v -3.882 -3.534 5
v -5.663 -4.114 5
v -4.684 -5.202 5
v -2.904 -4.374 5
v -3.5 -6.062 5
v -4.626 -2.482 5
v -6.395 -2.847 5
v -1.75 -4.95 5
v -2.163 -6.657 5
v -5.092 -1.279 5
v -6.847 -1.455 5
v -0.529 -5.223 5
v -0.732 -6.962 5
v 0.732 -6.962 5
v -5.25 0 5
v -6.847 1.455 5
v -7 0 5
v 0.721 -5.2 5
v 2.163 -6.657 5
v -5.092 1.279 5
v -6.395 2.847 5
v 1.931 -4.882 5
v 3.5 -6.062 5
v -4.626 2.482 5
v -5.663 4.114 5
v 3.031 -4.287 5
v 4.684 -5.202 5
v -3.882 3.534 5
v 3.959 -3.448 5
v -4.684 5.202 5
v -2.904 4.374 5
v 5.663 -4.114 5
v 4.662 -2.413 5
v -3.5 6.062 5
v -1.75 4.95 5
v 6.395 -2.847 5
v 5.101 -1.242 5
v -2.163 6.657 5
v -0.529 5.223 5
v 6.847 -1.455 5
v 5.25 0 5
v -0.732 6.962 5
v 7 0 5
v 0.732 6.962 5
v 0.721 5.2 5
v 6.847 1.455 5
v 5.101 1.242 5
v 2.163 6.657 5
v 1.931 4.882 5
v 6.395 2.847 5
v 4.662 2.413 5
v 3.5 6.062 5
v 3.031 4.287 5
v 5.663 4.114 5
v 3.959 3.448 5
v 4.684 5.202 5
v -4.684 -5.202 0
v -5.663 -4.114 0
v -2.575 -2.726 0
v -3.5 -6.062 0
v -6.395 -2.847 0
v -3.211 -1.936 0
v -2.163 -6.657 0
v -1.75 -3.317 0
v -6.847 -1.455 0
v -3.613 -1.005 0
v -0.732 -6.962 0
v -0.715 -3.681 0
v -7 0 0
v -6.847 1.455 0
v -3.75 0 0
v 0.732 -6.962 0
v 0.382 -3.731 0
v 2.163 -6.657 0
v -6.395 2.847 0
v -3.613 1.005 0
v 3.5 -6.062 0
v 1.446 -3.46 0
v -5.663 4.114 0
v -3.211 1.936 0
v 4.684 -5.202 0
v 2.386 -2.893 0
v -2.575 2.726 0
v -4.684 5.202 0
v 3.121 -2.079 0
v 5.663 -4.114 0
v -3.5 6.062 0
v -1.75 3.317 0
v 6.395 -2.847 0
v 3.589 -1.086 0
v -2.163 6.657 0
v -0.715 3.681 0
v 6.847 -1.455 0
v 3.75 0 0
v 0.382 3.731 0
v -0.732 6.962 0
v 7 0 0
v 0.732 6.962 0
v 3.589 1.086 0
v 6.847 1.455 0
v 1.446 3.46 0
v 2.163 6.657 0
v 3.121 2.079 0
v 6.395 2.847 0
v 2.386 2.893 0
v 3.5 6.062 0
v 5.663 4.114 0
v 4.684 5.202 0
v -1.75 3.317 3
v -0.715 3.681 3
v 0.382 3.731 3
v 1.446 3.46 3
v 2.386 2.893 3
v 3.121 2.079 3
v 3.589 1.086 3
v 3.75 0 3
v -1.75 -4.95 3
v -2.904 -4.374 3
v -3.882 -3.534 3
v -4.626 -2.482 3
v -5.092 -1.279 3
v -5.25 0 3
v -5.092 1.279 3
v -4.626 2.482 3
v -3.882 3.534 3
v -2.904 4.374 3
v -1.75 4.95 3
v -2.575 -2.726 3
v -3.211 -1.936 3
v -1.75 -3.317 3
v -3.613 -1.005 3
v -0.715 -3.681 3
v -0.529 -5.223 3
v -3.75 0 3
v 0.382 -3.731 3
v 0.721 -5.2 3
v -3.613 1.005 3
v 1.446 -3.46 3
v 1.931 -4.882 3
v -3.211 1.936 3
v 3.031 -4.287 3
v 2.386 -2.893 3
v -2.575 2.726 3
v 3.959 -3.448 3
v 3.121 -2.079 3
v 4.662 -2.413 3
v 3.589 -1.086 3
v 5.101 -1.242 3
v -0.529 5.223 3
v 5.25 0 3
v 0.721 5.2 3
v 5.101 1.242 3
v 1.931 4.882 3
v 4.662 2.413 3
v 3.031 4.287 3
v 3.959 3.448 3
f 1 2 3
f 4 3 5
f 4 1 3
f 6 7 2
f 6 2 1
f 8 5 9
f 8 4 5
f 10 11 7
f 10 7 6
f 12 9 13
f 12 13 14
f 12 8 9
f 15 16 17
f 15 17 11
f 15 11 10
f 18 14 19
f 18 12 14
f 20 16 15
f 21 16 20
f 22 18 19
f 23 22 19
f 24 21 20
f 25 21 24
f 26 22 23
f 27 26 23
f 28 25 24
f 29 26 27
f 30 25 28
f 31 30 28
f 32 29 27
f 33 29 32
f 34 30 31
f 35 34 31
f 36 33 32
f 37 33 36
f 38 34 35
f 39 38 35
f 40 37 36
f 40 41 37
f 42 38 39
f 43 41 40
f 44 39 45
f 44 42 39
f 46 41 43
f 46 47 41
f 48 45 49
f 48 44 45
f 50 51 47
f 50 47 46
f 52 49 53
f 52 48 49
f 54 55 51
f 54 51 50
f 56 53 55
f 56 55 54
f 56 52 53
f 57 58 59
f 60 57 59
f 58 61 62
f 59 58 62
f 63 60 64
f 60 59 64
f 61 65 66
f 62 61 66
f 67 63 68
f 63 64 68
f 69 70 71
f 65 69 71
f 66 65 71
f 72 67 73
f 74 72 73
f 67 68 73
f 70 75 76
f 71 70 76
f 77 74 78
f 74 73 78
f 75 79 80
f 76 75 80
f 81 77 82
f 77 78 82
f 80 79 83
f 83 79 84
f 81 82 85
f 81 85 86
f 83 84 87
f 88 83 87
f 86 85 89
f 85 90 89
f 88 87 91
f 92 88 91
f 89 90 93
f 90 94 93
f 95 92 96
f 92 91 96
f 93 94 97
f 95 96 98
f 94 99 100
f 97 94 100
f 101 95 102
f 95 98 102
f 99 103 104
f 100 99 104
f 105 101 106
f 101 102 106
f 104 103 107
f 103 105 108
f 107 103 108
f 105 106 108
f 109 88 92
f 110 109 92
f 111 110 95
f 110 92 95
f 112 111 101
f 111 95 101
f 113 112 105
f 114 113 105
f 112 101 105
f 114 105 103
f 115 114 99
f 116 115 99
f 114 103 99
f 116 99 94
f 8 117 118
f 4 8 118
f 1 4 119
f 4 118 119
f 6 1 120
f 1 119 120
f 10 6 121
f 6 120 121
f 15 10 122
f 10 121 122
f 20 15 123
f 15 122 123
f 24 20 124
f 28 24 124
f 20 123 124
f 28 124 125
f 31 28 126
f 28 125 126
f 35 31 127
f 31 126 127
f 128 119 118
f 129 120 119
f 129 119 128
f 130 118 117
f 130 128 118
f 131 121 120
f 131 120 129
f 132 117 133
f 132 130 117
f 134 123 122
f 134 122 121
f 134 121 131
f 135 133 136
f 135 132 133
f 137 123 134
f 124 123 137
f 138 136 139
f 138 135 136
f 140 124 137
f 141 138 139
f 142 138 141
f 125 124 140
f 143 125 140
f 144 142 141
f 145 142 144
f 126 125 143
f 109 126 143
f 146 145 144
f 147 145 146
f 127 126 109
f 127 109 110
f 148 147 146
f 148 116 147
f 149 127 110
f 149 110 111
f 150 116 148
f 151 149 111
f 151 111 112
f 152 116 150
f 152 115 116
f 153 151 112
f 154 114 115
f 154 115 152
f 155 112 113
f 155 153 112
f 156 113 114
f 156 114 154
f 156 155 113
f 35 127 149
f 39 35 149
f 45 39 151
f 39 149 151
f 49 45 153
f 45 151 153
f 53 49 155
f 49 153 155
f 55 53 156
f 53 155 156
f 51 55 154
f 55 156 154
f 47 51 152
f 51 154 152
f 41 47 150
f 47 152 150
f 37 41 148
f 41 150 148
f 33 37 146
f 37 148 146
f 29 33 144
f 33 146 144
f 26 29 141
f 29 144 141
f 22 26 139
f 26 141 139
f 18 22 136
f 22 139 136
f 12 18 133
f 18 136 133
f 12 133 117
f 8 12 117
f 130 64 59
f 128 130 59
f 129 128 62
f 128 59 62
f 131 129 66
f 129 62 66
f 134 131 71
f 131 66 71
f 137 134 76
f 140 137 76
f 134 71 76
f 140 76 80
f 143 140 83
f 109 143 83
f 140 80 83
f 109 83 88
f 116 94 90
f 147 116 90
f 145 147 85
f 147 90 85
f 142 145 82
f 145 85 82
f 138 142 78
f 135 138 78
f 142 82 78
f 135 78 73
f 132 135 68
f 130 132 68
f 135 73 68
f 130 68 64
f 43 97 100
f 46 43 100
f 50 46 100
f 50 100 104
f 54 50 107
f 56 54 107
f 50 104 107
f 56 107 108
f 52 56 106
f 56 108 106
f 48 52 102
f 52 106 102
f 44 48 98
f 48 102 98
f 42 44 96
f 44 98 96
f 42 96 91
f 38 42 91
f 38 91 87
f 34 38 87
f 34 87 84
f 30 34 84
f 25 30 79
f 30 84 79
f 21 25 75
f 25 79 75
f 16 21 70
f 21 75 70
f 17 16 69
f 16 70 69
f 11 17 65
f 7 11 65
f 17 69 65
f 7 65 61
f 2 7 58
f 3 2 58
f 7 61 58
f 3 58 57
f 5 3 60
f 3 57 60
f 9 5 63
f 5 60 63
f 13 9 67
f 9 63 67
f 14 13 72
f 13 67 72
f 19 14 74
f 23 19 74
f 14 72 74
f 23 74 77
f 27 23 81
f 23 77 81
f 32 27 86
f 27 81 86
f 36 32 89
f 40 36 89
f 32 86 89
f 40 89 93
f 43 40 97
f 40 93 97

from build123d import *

# Parameters (mm, degrees)
F0_R     = 7
F1_DEPTH = 5
F2_DEPTH = 3


with BuildPart() as f1:
    # F0 (on Top) → F1 (new body)
    with BuildSketch(Plane.XY):
        Circle(F0_R)
        with BuildLine():
            ThreePointArc((-1.75, -4.9497474683), (-5.25, 0), (-1.75, 4.9497474683))
            ThreePointArc((-1.75, 4.9497474683), (3.0310889132, 4.2866070499), (5.25, 0))
            ThreePointArc((5.25, 0), (3.0310889132, -4.2866070499), (-1.75, -4.9497474683))
        make_face(mode=Mode.SUBTRACT)
    extrude(amount=F1_DEPTH)

    # F0 (on Top) → F2 (join)
    with BuildSketch(Plane.XY):
        with BuildLine():
            ThreePointArc((-1.75, 3.3166247904), (1.9364916731, 3.2113081447), (3.75, 0))
            ThreePointArc((3.75, 0), (1.9364916731, -3.2113081447), (-1.75, -3.3166247904))
            Line((-1.75, -3.3166247904), (-1.75, -4.9497474683))
            ThreePointArc((-1.75, -4.9497474683), (3.0310889132, -4.2866070499), (5.25, 0))
            ThreePointArc((5.25, 0), (3.0310889132, 4.2866070499), (-1.75, 4.9497474683))
            Line((-1.75, 4.9497474683), (-1.75, 3.3166247904))
        make_face()
        with BuildLine():
            ThreePointArc((-1.75, -3.3166247904), (-3.75, 0), (-1.75, 3.3166247904))
            Line((-1.75, 3.3166247904), (-1.75, 4.9497474683))
            ThreePointArc((-1.75, 4.9497474683), (-5.25, 0), (-1.75, -4.9497474683))
            Line((-1.75, -4.9497474683), (-1.75, -3.3166247904))
        make_face()
    extrude(amount=F2_DEPTH)


solid = f1.part
